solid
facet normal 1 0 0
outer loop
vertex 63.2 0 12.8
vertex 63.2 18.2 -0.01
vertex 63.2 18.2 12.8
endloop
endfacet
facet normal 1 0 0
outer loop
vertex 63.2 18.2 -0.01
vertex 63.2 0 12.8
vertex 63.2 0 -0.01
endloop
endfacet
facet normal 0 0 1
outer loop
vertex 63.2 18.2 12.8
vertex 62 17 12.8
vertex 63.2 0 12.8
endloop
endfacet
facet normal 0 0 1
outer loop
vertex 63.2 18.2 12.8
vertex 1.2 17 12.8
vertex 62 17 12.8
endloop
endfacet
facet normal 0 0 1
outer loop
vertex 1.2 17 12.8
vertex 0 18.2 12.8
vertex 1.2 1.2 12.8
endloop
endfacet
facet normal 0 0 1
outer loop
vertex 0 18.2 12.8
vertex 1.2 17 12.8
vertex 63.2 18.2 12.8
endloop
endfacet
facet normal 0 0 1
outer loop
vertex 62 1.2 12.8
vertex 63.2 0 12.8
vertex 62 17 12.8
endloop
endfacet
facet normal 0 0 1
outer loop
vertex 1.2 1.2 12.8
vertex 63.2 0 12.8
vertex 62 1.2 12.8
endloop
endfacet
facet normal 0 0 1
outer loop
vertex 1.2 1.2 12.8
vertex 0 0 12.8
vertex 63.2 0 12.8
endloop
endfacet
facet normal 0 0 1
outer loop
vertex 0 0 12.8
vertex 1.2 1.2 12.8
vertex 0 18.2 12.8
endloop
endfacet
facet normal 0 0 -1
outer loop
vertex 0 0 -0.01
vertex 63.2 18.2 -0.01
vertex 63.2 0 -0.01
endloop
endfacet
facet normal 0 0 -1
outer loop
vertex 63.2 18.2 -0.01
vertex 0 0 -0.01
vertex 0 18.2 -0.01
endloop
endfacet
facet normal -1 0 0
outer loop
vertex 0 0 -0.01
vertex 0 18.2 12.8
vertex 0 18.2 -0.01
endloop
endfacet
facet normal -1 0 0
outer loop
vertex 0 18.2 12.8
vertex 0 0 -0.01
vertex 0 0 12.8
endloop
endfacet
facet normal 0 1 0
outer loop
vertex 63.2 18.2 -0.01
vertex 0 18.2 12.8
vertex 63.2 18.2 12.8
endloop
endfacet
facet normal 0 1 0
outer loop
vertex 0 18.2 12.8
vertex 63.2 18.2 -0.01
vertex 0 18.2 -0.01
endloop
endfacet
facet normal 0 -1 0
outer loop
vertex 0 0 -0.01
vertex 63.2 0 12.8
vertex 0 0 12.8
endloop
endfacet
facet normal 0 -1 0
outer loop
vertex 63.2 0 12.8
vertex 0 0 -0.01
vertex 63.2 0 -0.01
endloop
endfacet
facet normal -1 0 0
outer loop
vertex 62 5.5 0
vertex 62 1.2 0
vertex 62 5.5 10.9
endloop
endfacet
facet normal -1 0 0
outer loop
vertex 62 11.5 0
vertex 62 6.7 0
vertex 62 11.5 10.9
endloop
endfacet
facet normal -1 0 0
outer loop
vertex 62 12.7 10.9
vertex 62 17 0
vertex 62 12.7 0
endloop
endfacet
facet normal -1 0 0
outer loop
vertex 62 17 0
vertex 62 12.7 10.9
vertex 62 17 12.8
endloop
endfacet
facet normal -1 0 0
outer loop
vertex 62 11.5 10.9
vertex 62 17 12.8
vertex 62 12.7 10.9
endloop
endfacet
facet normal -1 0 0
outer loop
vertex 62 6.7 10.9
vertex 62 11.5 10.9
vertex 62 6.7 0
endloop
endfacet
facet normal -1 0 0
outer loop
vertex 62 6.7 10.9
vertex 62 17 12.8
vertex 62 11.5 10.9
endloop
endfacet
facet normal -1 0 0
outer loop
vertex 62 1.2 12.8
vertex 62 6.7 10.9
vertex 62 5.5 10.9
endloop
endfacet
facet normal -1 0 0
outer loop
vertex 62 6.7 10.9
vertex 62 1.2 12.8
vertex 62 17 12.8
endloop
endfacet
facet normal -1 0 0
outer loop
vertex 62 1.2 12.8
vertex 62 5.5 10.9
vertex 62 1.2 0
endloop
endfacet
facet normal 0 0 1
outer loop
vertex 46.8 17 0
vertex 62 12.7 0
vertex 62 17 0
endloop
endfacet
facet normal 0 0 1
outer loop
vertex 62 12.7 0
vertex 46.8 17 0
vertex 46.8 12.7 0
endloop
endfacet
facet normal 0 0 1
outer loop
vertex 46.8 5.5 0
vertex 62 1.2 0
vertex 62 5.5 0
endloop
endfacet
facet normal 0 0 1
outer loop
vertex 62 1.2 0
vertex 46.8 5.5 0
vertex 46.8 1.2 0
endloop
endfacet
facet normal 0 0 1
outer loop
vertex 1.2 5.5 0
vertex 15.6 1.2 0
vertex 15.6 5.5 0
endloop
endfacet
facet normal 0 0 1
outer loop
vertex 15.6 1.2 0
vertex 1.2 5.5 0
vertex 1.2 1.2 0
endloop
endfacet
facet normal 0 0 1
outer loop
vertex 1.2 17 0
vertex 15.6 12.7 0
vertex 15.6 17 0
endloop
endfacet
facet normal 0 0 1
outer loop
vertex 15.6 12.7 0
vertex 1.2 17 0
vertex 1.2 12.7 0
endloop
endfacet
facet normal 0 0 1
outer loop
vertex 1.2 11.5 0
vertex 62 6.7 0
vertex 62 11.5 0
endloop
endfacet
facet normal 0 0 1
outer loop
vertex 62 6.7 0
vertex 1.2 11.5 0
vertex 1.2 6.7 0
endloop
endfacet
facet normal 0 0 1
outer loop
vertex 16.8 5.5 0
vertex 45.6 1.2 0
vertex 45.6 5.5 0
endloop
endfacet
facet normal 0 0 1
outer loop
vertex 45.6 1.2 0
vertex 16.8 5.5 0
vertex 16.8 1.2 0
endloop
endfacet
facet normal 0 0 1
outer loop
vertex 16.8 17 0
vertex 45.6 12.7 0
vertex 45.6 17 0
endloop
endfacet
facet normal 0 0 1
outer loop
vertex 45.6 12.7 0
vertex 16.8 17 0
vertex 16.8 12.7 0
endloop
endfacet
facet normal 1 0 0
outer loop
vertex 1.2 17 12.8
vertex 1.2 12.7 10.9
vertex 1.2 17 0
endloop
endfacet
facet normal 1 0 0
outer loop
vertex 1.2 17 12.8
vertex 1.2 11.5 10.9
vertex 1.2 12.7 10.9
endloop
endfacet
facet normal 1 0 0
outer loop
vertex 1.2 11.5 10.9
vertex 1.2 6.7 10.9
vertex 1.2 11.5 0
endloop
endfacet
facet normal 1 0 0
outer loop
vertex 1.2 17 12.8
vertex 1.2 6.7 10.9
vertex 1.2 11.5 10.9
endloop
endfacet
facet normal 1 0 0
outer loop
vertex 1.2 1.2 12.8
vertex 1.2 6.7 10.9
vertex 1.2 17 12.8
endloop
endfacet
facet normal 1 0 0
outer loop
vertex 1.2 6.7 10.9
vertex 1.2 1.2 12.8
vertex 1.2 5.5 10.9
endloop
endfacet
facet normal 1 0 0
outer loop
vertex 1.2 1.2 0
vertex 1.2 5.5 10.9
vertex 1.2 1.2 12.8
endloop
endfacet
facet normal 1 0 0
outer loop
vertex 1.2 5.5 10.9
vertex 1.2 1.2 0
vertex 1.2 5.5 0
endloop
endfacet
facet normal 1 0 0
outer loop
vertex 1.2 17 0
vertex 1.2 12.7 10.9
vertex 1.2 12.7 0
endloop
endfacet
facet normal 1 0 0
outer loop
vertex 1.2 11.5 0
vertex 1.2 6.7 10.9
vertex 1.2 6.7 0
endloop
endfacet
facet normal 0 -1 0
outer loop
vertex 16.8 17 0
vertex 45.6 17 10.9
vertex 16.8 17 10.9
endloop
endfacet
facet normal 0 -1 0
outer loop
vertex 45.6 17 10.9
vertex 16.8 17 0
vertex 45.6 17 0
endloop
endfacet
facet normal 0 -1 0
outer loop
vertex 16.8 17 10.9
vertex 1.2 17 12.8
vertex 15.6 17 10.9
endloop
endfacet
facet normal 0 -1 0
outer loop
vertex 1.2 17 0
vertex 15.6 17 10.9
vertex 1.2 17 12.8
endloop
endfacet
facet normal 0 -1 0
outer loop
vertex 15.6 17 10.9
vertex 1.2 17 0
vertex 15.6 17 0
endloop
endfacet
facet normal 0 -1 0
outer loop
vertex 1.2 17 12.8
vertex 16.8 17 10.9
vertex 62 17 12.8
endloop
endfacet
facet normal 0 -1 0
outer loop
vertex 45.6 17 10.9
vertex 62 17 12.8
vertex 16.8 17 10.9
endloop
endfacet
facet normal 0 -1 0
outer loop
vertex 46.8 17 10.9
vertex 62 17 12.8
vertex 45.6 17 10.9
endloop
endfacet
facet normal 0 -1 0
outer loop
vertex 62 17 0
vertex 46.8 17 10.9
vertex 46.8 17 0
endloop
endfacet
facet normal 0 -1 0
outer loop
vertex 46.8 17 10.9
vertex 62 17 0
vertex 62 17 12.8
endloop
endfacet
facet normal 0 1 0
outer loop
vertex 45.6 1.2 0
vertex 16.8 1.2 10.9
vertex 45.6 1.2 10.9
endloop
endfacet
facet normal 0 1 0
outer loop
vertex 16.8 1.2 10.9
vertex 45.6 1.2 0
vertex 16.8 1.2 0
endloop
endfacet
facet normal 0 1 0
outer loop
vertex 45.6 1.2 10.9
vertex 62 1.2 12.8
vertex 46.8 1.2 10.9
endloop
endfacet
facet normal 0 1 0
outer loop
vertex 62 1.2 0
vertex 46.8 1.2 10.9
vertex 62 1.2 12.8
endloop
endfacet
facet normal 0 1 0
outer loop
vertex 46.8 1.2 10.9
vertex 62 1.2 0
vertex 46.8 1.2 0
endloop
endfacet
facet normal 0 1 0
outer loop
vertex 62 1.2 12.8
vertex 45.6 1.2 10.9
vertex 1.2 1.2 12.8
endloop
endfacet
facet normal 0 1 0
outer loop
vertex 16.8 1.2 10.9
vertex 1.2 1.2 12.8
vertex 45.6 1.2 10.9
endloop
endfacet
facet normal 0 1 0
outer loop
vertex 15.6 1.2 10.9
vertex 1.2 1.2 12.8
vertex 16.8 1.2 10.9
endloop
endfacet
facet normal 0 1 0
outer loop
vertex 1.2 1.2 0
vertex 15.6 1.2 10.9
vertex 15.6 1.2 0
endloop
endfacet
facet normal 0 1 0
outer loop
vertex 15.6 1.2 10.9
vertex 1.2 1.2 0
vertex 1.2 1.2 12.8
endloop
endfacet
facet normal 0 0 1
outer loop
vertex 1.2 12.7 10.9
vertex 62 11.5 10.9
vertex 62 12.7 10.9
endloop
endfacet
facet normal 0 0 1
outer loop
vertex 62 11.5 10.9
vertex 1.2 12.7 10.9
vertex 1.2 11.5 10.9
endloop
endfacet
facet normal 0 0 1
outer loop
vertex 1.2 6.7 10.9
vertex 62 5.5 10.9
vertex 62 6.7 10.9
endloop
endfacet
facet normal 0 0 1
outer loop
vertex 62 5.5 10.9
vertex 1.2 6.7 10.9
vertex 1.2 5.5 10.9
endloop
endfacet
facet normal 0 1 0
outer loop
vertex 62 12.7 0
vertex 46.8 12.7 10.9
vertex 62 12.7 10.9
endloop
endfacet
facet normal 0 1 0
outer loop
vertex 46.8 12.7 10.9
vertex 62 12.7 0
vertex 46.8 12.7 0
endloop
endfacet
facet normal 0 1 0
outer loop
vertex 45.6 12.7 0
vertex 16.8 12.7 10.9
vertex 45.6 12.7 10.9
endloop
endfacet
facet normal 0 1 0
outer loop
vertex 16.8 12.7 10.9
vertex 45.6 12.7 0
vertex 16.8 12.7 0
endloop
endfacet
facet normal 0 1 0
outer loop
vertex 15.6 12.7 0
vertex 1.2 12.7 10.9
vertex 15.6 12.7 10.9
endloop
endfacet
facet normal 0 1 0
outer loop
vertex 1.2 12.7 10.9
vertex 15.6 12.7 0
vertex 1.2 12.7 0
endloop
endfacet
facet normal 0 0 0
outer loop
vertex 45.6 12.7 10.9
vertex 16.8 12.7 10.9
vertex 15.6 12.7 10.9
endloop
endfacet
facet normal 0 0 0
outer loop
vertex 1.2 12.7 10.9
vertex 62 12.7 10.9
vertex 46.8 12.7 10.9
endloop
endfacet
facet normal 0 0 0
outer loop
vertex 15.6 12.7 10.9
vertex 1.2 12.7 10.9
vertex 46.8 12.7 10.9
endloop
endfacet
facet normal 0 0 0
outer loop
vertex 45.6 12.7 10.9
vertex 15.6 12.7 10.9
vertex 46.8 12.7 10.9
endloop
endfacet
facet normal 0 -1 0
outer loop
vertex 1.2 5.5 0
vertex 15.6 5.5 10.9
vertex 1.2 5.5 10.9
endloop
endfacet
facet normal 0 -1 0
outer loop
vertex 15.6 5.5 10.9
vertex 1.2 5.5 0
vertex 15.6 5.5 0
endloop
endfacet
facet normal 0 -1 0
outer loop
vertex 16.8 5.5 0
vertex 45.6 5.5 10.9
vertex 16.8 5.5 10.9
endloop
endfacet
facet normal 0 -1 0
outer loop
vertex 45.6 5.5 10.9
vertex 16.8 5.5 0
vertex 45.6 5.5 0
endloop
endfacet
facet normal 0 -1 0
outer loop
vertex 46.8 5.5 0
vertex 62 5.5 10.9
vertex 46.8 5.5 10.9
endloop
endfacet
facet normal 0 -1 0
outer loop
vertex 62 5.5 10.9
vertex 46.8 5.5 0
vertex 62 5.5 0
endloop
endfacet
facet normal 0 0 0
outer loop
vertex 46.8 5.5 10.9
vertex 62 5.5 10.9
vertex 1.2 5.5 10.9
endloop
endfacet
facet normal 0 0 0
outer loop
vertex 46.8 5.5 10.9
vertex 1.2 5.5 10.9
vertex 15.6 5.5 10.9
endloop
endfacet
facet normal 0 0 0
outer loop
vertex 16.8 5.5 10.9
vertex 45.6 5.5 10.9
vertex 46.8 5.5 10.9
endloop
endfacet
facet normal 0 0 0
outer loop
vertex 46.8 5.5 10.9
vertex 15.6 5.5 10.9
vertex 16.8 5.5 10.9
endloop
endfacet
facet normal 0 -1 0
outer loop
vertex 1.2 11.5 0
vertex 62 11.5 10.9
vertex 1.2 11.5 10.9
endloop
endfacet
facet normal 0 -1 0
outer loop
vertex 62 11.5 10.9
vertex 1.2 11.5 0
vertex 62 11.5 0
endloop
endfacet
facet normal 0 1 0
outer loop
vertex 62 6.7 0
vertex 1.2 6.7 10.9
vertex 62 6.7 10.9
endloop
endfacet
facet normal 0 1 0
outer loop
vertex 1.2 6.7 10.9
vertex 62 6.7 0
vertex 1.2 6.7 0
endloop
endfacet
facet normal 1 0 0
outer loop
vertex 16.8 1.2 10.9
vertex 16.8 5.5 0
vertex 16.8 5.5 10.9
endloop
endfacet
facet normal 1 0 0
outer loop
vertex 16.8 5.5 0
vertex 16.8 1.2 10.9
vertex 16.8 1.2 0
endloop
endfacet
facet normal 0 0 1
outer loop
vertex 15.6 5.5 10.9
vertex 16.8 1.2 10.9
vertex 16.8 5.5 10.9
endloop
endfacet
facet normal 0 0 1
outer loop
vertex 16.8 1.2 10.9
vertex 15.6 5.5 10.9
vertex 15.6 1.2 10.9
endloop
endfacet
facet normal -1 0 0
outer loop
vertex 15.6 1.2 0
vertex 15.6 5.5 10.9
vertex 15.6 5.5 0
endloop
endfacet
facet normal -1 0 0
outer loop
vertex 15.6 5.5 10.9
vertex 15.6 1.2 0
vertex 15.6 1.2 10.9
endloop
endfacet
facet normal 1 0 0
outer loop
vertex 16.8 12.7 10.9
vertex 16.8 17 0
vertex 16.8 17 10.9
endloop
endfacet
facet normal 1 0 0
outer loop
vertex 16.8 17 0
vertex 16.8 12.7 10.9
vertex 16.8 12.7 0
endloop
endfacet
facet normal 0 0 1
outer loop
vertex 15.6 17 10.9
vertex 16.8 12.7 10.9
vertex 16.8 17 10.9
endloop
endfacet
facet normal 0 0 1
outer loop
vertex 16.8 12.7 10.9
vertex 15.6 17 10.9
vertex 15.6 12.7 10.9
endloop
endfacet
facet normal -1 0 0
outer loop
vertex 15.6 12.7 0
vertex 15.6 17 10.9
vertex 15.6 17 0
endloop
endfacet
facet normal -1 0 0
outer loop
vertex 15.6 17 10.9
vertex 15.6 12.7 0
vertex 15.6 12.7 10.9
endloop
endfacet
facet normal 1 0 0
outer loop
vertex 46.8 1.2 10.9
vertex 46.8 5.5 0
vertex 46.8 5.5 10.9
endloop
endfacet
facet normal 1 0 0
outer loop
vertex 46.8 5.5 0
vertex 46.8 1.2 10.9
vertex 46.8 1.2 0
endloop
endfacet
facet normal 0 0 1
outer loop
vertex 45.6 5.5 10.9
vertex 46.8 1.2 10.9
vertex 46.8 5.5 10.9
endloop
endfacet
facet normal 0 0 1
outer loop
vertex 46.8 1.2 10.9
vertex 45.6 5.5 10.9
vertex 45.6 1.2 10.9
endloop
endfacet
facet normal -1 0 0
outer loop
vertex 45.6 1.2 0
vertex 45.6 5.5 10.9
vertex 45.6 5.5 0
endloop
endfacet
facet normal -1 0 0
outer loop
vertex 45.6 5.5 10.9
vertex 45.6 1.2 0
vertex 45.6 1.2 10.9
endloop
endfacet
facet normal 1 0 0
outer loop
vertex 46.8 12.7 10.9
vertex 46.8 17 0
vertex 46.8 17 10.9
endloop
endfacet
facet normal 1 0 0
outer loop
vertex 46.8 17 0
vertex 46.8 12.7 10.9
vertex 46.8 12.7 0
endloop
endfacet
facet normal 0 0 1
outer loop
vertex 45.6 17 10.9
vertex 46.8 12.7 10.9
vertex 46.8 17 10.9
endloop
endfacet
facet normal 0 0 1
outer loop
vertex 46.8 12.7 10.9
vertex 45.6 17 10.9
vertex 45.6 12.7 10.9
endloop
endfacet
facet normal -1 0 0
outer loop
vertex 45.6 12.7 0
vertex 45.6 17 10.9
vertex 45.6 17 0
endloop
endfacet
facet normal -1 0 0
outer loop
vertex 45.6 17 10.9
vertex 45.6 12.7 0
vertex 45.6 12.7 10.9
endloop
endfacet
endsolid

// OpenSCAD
// file: ../Base/Boxes.scad
// Fischertechnik Box Foundation
// Pre-designed Boxes

use <Constants.scad>

include <PlacementOptions.scad>

box190Width = 190;
box190Depth = 130;
box130Width = 130;
box130Depth = 95;
boxUsageHeight = 33.9;
boxWallThickness = 2.4;
boxBaseThickness = 1.0;

// getBoxWallThickness()
// Gets the wall thickness of a Fischertechnik Box

function getBoxWallThickness() = boxWallThickness;

// Gets the usable height of a fischertechnik box
function getBoxUsageHeight() = boxUsageHeight;

// Gets the thickness of the Fischertechnik box base.
function getBoxBaseThickness() = boxBaseThickness;

// Gets the usable inner space of a Box 190 as an x/y-list
function getBox190Space() = [
    box190Width - 2*getBoxWallThickness(), 
    box190Depth - 2*getBoxWallThickness() ];

// Imports the Fischertechnik empty box 130x190 mm and places it at position 0,0
// 190x130 are the outer sizes, the inner space is slightly smaller. Use getBox190Space() to get the inner sizes.
// This module needs the STL file "Fischertechnik Box 130x190.stl" in the library path.
// The box is positioned that the usable inner space is at the 0,0,0 position. The

module Box190() {
    translate([-getBoxWallThickness(),-getBoxWallThickness(),-getBoxBaseThickness()])
        import("Fischertechnik Box 130x190.stl", convexity=3);
}

// Gets the usable inner space of a Box 130 as an x/y-list
function getBox130Space() = [
    box130Width - 2*getBoxWallThickness(), 
    box130Depth - 2*getBoxWallThickness() ];

// Imports the Fischertechnik empty box 95x130 mm and places it at position 0,0
// 190x130 are the outer sizes, the inner space is slightly smaller. Use getBox190Space() to get the inner sizes.
// This module needs the STL file "Fischertechnik Box 95x130.stl" in the library path.
// The box is positioned that the usable inner space is at the 0,0,0 position. The

module Box130() {
    translate([-getBoxWallThickness(),-getBoxWallThickness(),-getBoxBaseThickness()])
        import("Fischertechnik Box 95x130.stl", convexity=3);
}

// Creates a web at the specified box walls
// corner 0 = LowerLeft, 1 = UpperLeft, 2 = UpperRight, 3 = LowerRight
// side 0 = LeftOfCorner, 1 = RightOfCorner
// distance = Distance in mm from the corner
// box = inner width and depth of the box (default: Box 190)
// webWidth = length of the web (default is 3 mms)
// webThickness = thickness of the web (default is 1 mm)

module BoxWeb(corner, side, distance, box=getBox190Space(), webWidth=3, webThickness=1.0) {
    sink = getBoxWallThickness()/2;

    width = (corner % 2 == 0) ? 
            (side == LeftOfCorner ? webWidth : webThickness) :
            (side == LeftOfCorner ? webThickness : webWidth);

    depth = (corner % 2 == 0) ? 
            (side == RightOfCorner ? webWidth : webThickness) :
            (side == RightOfCorner ? webThickness : webWidth);
    
    xDiff = corner == LowerLeft ? 
                (side == LeftOfCorner ? -sink : distance) :
            (corner == UpperLeft ?                
                (side == LeftOfCorner ? distance : -sink) :
            (corner == UpperRight ?
                (side == LeftOfCorner ? box.x-webWidth+sink : box.x-distance-webThickness) :
                (side == LeftOfCorner ? box.x-distance-webThickness: box.x-webWidth+sink)));

    yDiff = corner == LowerLeft ? 
                (side == RightOfCorner ? -sink : distance) :
            (corner == UpperLeft ?
                (side == RightOfCorner ? box.y-distance : box.y-webWidth+sink) :
            (corner == UpperRight ?
                (side == RightOfCorner ? box.y-webWidth+sink : box.y-distance) :
                (side == RightOfCorner ? distance : -sink)));
    
    translate([xDiff, yDiff, -getExcess()])
        cube([width, depth, boxUsageHeight + 2*getExcess()]);
}
// file: ../Base/Rotation.scad
// Fischertechnik Box Foundation
// Geometry Helpers Rotation

include <PlacementOptions.scad>

// getRotatedSpace(space, rotation=NoRotation)
// Rotates the space dependent on the specified rotation

function getRotatedSpace(space, rotation=NoRotation) = [
    (rotation == Rotate90 || rotation == Rotate270) ? space.y : space.x,
    (rotation == Rotate90 || rotation == Rotate270) ? space.x : space.y
];

// Rotates the given space around the fixed left lower corner
// space = the space the children needs as width/depth list [width,depth]
// rotation = 0 Rotate0 degrees, 1 Rotate90 degrees, 2 Rotate180 degrees, 3 Rotate270 degrees (equivalent to -90)

module RotateFix(space, rotation=Rotate0) {
    dy = (rotation == Rotate0 || rotation == Rotate270) ? 0 :
        (rotation == Rotate90) ? space.x :
        space.y;
    dx = (rotation < Rotate180) ? 0 :
        (rotation == Rotate180) ? space.x :
        space.y;
    
    translate([dx, dy, 0])
        rotate([0, 0, rotations[rotation]])
            children();
}
// file: ../Base/Alignment.scad
// Fischertechnik Box Foundation
// Geometry Helpers Alignment

include <PlacementOptions.scad>

// getAlignedX(elementWidth, spaceWidth, align=AlignRight, offset=0)
// Gets the aligned X offset of an element with the given
// width in the given space.
// elementWidth = The width of the element to positon
// spaceWidth = The space where the element should be aligned
// align = 0 AlignLeft, 1 AlignCenter, 2 AlignRight
// offset = an optional offset from the aligned position. When
// aligned left or centered, then positive values are in X direction.
// When aligned right then positive values are in negative X direction.

function getAlignedX(elementWidth, spaceWidth, align=AlignRight, offset=0) =
    (align == AlignLeft) ?
        offset :
        ((align == AlignCenter) ?
        (spaceWidth - elementWidth)/2 + offset :
        spaceWidth - offset - elementWidth);

// getAlignedY(elementDepth, spaceDepth, align=AlignTop, offset=0)
// Gets the aligned Y offset of an element with the given
// depth in the given space.
// elementDepth = The depth of the element to positon
// spaceDepth = The space where the element should be aligned
// align = 0 AlignBottom, 1 AlignCenter, 2 AlignTop
// offset = an optional offset from the aligned position. When
// aligned bottom or centered, then positive values are in Y direction.
// When aligned top then positive values are in negative Y direction.

function getAlignedY(elementDepth, spaceDepth, align=AlignTop, offset=0) =
    (align == AlignBottom) ?
        offset :
        ((align == AlignCenter) ?
        (spaceDepth - elementDepth)/2 + offset :
        spaceDepth - offset - elementDepth);
// file: ../Base/PlacementOptions.scad
// Fischertechnik Box Foundation
// Placement Options

// Alignment
NoAlign = 0;
AlignLeft = 1;
AlignBottom = 2;
AlignCenter = 3;
AlignRight = 4;
AlignTop = 5;

// Element rotation degree steps
rotations = [0, -90, -180, -270];

// Rotation
NoRotation = 0;
Rotate0 = 0;
Rotate90 = 1;
Rotate180 = 2;
Rotate270 = 3;

// Docking (seen from above)
NoDock = -1;
DockLeft = 0;
DockTop = 1;
DockRight = 2;
DockCorner = 2;
DockBottom = 3;

// Web corners
LowerLeft = 0;
UpperLeft = 1;
UpperRight = 2;
LowerRight = 3;

// Web position relative to corner
LeftOfCorner = 0;
RightOfCorner = 1;
// file: ../Base/Placement.scad
// Fischertechnik Box Foundation
// Geometry Helpers Placement

use <Constants.scad>
use <Alignment.scad>
use <Rotation.scad>
use <Boxes.scad>

include <PlacementOptions.scad>

// Place(x=0, y=0, elementSpace=[0,0], alignX=AlignLeft, alignY=AlignBottom, rotation=Rotate0, boxSpace=getBox190Space())
// Places the child at the specified position
// y = Y-Position. This is a relative position when an X aligment is specified.
// x = X-Position. This is a relative position when an Y aligment is specified.
// elementSpace = space of the element to be placed [x,y]
// alignX = -1=NoAlign, 0 AlignLeft, 1 AlignCenter, 3 AlignRight (elementSpace and boxSpace required!)
// alignY = -1=NoAlign, 2 AlignBottom, 1 AlignCenter, 4 AlignTop (elementSpace and boxSpace required!)
// rotation = 0 Rotate0 0 degrees, 1 Rotate90 90 degrees, 
// 2 Rotate180 180 degrees, 3 Rotate270 270 degrees (equivalent to -90)
// boxSpace = Inner space of the box where the placement occurs [x,y] - default is Box 190x130 inner space

module Place(x=0, y=0, elementSpace=[0,0], 
  alignX=AlignLeft, alignY=AlignBottom, 
  rotation=NoRotation, boxSpace=getBox190Space()) {

    module Position(x, y, space, rotation=Rotate0) {
        translate([x, y, 0])
            RotateFix(space, rotation)
                children(0);
    }

    space = getRotatedSpace(elementSpace, rotation);
    alignedX = getAlignedX(space.x, boxSpace.x, alignX, x);
    alignedY = getAlignedY(space.y, boxSpace.y, alignY, y);
    Position(alignedX, alignedY, elementSpace, rotation)
        children(0);
}

// Center(space=getBox130Space(), elementSpace=[0,0])
// space = Space where the children is centered. For cylinder use centered=true and no elementSpace.
// elementSpace = space of the element to be centered [x,y]

module Center(space=getBox190Space(), elementSpace=[0,0]) {
    translate([(space.x - elementSpace.x) / 2, (space.y - elementSpace.y) / 2])
        children(0);
}

// CenterHorizontal(width=0, y=0, offset=0, space=getBox130Space())
// space = Space where the children is centered. For cylinder use centered=true and no elementSpace.
// elementSpace = space of the element to be centered [x,y]

module CenterHorizontal(width=0, y=0, offset=0, space=getBox190Space()) {
    translate([(space.x - width) / 2 + offset, y])
        children(0);
}

// CenterVertical(depth=0, x=0, offset=0, space=getBox130Space())
// space = Space where the children is centered. For cylinder use centered=true and no elementSpace.
// elementSpace = space of the element to be centered [x,y]

module CenterVerticalal(depth=0, x=0, offset=0, space=getBox190Space()) {
    translate([x, (space.y - depth) / 2 + offset])
        children(0);
}
// file: ../Base/Constants.scad
// Fischertechnik Box Foundation
// Constants

// Constant values necessary for multiple elements

// Base constants
dividerThickness = 1.2;
excess = 0.01;
fragments = 90;
tolerance = 0.8;

// Gets the thickness of a divider 
function getDividerThickness() = dividerThickness;

// Gets the excess that is used to merge walls into each other
function getExcess() = excess;

// Gets amount of fragments of a cylinder
function getFragments() = fragments;

// Gets the inner tolerance of a frame to each side
function getTolerance() = tolerance;


// Fischertechnik specific constants
axisDiameter = 4;
axisBottomDiameter = axisDiameter + 1;
standardEdgeDistance = 2.5;
standardWebDistance = 11.5;
standardCornerLength = 15;
tubeWallFactor = 1.6;

// Gets axis diameter
function getAxisDiameter() = axisDiameter;

// Gets axis bottom diameter for thicker part at the bottom
function getAxisBottomDiameter() = axisBottomDiameter;

// gets the standard distance to the wall of the box for dockable frames with webs
function getStandardEdgeDistance() = standardEdgeDistance;

// gets the standard distance of each web to the corner of the dockable frame
function getStandardWebDistance() = standardWebDistance;

// gets the standard length of the corner walls of a dockable frame
function getStandardCornerLength() = standardCornerLength;

// gets the wall thickness of a tube.
function getTubeWallThickness() = tubeWallFactor * getDividerThickness();
// main file
// Fischertechnik Box Library
// Frame for Rack 60
// 31053

use <../Base/Constants.scad>
use <../ModelBase/Complex.scad>

width = 30;
depth = 15;
height = 12.8;
factor = 2;

// getFrameRack60Space(count=1)
// Gets the space for a frame for count racks 60 in one row.

function getFrameRack60Space(count=1) = getFrameRackSpace(factor, count);

// FrameRack(count)
// Frame for rack 60. The racks 30 are ordered in line.
// A frame for two racks 30 is identical to a single frame for a rack 60.
// count = Count of racks

module FrameRack60(count=1) {
    FrameRack(factor, count);
}

// Test
color("lightgray")
FrameRack60(1);
